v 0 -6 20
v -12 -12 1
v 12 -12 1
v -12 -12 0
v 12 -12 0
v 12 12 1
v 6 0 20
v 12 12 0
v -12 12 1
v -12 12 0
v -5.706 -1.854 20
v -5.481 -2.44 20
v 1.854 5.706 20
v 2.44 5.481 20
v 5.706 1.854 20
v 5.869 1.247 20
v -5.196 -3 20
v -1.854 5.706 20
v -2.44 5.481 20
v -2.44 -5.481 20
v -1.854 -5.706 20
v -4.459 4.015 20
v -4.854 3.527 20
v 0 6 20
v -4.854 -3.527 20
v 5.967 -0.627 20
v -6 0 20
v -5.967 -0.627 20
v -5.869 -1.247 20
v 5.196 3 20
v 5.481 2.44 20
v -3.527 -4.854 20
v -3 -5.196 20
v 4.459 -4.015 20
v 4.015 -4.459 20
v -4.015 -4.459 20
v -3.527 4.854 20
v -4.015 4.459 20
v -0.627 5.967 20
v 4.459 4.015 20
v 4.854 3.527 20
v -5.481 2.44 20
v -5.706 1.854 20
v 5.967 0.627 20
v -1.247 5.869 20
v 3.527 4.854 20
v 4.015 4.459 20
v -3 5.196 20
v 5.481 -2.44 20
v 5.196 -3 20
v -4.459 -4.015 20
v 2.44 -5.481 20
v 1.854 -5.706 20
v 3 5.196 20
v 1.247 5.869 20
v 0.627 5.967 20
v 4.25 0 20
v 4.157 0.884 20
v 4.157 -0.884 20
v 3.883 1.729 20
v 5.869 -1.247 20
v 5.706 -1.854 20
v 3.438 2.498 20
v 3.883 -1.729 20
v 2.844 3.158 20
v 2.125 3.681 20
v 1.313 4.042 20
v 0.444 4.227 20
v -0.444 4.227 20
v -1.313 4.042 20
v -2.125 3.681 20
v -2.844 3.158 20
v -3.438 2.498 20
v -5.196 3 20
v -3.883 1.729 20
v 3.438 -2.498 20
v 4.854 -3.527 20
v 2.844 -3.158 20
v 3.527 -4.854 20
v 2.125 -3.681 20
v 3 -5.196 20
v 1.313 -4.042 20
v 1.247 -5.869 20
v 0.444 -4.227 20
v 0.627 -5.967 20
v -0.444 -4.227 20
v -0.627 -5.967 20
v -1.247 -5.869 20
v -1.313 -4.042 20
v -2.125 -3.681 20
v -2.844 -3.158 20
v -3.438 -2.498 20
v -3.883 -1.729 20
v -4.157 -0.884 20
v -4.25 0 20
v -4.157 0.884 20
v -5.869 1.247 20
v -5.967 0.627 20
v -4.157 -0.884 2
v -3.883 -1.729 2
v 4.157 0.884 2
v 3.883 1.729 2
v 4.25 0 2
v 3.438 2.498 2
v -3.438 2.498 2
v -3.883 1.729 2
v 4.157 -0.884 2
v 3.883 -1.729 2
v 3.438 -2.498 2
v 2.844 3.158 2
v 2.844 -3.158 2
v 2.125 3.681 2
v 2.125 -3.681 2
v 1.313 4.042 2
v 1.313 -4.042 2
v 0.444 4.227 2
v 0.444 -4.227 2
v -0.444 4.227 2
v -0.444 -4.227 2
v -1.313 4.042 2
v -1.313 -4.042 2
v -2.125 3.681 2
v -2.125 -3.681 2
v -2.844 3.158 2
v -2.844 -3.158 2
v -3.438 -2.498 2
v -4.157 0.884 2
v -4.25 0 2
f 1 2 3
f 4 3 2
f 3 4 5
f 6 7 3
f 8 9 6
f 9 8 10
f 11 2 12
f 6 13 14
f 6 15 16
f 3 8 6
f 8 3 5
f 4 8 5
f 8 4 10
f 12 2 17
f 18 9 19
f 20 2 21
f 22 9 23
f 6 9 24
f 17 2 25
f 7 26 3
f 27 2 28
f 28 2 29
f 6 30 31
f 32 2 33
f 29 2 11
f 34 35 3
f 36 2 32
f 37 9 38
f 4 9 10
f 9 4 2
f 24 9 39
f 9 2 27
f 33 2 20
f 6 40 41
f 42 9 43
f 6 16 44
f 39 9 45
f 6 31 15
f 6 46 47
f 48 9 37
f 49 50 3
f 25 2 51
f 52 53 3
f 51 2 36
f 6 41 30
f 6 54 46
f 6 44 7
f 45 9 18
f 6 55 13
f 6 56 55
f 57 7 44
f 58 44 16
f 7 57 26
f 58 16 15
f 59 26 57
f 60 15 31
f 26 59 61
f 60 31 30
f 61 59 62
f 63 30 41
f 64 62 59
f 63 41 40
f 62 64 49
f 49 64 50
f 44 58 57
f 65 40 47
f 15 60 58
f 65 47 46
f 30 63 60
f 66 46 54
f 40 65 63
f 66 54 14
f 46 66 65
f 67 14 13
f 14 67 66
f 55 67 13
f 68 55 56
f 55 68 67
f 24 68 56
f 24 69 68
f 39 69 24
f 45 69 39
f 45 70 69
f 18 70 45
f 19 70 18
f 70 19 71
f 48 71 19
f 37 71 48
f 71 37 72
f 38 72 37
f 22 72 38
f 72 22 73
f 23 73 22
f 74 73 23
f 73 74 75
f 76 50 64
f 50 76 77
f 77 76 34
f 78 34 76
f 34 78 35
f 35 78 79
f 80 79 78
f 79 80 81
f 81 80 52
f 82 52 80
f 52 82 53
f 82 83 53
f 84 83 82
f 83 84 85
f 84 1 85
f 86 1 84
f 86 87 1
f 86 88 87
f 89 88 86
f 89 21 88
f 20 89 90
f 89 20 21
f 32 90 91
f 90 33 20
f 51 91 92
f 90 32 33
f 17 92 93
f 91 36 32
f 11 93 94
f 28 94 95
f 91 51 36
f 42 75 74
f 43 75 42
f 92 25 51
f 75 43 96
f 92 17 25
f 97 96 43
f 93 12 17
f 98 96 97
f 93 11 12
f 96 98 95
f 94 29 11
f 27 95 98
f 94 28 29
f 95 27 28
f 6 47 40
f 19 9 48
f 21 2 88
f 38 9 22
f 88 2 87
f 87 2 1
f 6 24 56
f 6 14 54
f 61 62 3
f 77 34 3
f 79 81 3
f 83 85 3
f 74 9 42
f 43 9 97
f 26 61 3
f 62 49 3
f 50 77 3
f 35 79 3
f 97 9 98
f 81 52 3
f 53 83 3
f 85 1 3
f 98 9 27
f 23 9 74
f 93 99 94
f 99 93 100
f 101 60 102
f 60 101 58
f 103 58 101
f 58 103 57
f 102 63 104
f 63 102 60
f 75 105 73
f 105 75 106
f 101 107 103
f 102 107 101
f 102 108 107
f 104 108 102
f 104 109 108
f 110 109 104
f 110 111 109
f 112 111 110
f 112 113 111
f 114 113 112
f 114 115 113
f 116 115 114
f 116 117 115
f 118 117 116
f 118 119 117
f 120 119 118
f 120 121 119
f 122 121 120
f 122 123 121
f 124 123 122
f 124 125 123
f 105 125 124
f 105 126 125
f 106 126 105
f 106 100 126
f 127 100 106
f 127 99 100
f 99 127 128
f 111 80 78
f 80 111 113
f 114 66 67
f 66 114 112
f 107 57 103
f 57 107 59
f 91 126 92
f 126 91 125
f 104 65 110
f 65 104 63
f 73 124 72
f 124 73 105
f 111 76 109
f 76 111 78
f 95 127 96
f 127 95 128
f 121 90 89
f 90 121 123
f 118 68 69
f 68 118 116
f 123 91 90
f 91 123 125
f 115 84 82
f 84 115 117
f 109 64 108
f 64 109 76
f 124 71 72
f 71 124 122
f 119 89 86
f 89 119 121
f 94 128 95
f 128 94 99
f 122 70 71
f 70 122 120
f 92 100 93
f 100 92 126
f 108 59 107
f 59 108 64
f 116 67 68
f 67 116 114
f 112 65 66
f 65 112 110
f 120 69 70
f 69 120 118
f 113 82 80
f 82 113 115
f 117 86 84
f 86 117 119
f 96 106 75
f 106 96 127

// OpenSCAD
difference(){
hull(){
translate([-12,-12,0])cube([24,24,1]);
translate([0,0,0])cylinder(d=12,h=20,$fn=60);
}
translate([0,0,2])cylinder(d=8.5,h=20,$fn=30);
}
